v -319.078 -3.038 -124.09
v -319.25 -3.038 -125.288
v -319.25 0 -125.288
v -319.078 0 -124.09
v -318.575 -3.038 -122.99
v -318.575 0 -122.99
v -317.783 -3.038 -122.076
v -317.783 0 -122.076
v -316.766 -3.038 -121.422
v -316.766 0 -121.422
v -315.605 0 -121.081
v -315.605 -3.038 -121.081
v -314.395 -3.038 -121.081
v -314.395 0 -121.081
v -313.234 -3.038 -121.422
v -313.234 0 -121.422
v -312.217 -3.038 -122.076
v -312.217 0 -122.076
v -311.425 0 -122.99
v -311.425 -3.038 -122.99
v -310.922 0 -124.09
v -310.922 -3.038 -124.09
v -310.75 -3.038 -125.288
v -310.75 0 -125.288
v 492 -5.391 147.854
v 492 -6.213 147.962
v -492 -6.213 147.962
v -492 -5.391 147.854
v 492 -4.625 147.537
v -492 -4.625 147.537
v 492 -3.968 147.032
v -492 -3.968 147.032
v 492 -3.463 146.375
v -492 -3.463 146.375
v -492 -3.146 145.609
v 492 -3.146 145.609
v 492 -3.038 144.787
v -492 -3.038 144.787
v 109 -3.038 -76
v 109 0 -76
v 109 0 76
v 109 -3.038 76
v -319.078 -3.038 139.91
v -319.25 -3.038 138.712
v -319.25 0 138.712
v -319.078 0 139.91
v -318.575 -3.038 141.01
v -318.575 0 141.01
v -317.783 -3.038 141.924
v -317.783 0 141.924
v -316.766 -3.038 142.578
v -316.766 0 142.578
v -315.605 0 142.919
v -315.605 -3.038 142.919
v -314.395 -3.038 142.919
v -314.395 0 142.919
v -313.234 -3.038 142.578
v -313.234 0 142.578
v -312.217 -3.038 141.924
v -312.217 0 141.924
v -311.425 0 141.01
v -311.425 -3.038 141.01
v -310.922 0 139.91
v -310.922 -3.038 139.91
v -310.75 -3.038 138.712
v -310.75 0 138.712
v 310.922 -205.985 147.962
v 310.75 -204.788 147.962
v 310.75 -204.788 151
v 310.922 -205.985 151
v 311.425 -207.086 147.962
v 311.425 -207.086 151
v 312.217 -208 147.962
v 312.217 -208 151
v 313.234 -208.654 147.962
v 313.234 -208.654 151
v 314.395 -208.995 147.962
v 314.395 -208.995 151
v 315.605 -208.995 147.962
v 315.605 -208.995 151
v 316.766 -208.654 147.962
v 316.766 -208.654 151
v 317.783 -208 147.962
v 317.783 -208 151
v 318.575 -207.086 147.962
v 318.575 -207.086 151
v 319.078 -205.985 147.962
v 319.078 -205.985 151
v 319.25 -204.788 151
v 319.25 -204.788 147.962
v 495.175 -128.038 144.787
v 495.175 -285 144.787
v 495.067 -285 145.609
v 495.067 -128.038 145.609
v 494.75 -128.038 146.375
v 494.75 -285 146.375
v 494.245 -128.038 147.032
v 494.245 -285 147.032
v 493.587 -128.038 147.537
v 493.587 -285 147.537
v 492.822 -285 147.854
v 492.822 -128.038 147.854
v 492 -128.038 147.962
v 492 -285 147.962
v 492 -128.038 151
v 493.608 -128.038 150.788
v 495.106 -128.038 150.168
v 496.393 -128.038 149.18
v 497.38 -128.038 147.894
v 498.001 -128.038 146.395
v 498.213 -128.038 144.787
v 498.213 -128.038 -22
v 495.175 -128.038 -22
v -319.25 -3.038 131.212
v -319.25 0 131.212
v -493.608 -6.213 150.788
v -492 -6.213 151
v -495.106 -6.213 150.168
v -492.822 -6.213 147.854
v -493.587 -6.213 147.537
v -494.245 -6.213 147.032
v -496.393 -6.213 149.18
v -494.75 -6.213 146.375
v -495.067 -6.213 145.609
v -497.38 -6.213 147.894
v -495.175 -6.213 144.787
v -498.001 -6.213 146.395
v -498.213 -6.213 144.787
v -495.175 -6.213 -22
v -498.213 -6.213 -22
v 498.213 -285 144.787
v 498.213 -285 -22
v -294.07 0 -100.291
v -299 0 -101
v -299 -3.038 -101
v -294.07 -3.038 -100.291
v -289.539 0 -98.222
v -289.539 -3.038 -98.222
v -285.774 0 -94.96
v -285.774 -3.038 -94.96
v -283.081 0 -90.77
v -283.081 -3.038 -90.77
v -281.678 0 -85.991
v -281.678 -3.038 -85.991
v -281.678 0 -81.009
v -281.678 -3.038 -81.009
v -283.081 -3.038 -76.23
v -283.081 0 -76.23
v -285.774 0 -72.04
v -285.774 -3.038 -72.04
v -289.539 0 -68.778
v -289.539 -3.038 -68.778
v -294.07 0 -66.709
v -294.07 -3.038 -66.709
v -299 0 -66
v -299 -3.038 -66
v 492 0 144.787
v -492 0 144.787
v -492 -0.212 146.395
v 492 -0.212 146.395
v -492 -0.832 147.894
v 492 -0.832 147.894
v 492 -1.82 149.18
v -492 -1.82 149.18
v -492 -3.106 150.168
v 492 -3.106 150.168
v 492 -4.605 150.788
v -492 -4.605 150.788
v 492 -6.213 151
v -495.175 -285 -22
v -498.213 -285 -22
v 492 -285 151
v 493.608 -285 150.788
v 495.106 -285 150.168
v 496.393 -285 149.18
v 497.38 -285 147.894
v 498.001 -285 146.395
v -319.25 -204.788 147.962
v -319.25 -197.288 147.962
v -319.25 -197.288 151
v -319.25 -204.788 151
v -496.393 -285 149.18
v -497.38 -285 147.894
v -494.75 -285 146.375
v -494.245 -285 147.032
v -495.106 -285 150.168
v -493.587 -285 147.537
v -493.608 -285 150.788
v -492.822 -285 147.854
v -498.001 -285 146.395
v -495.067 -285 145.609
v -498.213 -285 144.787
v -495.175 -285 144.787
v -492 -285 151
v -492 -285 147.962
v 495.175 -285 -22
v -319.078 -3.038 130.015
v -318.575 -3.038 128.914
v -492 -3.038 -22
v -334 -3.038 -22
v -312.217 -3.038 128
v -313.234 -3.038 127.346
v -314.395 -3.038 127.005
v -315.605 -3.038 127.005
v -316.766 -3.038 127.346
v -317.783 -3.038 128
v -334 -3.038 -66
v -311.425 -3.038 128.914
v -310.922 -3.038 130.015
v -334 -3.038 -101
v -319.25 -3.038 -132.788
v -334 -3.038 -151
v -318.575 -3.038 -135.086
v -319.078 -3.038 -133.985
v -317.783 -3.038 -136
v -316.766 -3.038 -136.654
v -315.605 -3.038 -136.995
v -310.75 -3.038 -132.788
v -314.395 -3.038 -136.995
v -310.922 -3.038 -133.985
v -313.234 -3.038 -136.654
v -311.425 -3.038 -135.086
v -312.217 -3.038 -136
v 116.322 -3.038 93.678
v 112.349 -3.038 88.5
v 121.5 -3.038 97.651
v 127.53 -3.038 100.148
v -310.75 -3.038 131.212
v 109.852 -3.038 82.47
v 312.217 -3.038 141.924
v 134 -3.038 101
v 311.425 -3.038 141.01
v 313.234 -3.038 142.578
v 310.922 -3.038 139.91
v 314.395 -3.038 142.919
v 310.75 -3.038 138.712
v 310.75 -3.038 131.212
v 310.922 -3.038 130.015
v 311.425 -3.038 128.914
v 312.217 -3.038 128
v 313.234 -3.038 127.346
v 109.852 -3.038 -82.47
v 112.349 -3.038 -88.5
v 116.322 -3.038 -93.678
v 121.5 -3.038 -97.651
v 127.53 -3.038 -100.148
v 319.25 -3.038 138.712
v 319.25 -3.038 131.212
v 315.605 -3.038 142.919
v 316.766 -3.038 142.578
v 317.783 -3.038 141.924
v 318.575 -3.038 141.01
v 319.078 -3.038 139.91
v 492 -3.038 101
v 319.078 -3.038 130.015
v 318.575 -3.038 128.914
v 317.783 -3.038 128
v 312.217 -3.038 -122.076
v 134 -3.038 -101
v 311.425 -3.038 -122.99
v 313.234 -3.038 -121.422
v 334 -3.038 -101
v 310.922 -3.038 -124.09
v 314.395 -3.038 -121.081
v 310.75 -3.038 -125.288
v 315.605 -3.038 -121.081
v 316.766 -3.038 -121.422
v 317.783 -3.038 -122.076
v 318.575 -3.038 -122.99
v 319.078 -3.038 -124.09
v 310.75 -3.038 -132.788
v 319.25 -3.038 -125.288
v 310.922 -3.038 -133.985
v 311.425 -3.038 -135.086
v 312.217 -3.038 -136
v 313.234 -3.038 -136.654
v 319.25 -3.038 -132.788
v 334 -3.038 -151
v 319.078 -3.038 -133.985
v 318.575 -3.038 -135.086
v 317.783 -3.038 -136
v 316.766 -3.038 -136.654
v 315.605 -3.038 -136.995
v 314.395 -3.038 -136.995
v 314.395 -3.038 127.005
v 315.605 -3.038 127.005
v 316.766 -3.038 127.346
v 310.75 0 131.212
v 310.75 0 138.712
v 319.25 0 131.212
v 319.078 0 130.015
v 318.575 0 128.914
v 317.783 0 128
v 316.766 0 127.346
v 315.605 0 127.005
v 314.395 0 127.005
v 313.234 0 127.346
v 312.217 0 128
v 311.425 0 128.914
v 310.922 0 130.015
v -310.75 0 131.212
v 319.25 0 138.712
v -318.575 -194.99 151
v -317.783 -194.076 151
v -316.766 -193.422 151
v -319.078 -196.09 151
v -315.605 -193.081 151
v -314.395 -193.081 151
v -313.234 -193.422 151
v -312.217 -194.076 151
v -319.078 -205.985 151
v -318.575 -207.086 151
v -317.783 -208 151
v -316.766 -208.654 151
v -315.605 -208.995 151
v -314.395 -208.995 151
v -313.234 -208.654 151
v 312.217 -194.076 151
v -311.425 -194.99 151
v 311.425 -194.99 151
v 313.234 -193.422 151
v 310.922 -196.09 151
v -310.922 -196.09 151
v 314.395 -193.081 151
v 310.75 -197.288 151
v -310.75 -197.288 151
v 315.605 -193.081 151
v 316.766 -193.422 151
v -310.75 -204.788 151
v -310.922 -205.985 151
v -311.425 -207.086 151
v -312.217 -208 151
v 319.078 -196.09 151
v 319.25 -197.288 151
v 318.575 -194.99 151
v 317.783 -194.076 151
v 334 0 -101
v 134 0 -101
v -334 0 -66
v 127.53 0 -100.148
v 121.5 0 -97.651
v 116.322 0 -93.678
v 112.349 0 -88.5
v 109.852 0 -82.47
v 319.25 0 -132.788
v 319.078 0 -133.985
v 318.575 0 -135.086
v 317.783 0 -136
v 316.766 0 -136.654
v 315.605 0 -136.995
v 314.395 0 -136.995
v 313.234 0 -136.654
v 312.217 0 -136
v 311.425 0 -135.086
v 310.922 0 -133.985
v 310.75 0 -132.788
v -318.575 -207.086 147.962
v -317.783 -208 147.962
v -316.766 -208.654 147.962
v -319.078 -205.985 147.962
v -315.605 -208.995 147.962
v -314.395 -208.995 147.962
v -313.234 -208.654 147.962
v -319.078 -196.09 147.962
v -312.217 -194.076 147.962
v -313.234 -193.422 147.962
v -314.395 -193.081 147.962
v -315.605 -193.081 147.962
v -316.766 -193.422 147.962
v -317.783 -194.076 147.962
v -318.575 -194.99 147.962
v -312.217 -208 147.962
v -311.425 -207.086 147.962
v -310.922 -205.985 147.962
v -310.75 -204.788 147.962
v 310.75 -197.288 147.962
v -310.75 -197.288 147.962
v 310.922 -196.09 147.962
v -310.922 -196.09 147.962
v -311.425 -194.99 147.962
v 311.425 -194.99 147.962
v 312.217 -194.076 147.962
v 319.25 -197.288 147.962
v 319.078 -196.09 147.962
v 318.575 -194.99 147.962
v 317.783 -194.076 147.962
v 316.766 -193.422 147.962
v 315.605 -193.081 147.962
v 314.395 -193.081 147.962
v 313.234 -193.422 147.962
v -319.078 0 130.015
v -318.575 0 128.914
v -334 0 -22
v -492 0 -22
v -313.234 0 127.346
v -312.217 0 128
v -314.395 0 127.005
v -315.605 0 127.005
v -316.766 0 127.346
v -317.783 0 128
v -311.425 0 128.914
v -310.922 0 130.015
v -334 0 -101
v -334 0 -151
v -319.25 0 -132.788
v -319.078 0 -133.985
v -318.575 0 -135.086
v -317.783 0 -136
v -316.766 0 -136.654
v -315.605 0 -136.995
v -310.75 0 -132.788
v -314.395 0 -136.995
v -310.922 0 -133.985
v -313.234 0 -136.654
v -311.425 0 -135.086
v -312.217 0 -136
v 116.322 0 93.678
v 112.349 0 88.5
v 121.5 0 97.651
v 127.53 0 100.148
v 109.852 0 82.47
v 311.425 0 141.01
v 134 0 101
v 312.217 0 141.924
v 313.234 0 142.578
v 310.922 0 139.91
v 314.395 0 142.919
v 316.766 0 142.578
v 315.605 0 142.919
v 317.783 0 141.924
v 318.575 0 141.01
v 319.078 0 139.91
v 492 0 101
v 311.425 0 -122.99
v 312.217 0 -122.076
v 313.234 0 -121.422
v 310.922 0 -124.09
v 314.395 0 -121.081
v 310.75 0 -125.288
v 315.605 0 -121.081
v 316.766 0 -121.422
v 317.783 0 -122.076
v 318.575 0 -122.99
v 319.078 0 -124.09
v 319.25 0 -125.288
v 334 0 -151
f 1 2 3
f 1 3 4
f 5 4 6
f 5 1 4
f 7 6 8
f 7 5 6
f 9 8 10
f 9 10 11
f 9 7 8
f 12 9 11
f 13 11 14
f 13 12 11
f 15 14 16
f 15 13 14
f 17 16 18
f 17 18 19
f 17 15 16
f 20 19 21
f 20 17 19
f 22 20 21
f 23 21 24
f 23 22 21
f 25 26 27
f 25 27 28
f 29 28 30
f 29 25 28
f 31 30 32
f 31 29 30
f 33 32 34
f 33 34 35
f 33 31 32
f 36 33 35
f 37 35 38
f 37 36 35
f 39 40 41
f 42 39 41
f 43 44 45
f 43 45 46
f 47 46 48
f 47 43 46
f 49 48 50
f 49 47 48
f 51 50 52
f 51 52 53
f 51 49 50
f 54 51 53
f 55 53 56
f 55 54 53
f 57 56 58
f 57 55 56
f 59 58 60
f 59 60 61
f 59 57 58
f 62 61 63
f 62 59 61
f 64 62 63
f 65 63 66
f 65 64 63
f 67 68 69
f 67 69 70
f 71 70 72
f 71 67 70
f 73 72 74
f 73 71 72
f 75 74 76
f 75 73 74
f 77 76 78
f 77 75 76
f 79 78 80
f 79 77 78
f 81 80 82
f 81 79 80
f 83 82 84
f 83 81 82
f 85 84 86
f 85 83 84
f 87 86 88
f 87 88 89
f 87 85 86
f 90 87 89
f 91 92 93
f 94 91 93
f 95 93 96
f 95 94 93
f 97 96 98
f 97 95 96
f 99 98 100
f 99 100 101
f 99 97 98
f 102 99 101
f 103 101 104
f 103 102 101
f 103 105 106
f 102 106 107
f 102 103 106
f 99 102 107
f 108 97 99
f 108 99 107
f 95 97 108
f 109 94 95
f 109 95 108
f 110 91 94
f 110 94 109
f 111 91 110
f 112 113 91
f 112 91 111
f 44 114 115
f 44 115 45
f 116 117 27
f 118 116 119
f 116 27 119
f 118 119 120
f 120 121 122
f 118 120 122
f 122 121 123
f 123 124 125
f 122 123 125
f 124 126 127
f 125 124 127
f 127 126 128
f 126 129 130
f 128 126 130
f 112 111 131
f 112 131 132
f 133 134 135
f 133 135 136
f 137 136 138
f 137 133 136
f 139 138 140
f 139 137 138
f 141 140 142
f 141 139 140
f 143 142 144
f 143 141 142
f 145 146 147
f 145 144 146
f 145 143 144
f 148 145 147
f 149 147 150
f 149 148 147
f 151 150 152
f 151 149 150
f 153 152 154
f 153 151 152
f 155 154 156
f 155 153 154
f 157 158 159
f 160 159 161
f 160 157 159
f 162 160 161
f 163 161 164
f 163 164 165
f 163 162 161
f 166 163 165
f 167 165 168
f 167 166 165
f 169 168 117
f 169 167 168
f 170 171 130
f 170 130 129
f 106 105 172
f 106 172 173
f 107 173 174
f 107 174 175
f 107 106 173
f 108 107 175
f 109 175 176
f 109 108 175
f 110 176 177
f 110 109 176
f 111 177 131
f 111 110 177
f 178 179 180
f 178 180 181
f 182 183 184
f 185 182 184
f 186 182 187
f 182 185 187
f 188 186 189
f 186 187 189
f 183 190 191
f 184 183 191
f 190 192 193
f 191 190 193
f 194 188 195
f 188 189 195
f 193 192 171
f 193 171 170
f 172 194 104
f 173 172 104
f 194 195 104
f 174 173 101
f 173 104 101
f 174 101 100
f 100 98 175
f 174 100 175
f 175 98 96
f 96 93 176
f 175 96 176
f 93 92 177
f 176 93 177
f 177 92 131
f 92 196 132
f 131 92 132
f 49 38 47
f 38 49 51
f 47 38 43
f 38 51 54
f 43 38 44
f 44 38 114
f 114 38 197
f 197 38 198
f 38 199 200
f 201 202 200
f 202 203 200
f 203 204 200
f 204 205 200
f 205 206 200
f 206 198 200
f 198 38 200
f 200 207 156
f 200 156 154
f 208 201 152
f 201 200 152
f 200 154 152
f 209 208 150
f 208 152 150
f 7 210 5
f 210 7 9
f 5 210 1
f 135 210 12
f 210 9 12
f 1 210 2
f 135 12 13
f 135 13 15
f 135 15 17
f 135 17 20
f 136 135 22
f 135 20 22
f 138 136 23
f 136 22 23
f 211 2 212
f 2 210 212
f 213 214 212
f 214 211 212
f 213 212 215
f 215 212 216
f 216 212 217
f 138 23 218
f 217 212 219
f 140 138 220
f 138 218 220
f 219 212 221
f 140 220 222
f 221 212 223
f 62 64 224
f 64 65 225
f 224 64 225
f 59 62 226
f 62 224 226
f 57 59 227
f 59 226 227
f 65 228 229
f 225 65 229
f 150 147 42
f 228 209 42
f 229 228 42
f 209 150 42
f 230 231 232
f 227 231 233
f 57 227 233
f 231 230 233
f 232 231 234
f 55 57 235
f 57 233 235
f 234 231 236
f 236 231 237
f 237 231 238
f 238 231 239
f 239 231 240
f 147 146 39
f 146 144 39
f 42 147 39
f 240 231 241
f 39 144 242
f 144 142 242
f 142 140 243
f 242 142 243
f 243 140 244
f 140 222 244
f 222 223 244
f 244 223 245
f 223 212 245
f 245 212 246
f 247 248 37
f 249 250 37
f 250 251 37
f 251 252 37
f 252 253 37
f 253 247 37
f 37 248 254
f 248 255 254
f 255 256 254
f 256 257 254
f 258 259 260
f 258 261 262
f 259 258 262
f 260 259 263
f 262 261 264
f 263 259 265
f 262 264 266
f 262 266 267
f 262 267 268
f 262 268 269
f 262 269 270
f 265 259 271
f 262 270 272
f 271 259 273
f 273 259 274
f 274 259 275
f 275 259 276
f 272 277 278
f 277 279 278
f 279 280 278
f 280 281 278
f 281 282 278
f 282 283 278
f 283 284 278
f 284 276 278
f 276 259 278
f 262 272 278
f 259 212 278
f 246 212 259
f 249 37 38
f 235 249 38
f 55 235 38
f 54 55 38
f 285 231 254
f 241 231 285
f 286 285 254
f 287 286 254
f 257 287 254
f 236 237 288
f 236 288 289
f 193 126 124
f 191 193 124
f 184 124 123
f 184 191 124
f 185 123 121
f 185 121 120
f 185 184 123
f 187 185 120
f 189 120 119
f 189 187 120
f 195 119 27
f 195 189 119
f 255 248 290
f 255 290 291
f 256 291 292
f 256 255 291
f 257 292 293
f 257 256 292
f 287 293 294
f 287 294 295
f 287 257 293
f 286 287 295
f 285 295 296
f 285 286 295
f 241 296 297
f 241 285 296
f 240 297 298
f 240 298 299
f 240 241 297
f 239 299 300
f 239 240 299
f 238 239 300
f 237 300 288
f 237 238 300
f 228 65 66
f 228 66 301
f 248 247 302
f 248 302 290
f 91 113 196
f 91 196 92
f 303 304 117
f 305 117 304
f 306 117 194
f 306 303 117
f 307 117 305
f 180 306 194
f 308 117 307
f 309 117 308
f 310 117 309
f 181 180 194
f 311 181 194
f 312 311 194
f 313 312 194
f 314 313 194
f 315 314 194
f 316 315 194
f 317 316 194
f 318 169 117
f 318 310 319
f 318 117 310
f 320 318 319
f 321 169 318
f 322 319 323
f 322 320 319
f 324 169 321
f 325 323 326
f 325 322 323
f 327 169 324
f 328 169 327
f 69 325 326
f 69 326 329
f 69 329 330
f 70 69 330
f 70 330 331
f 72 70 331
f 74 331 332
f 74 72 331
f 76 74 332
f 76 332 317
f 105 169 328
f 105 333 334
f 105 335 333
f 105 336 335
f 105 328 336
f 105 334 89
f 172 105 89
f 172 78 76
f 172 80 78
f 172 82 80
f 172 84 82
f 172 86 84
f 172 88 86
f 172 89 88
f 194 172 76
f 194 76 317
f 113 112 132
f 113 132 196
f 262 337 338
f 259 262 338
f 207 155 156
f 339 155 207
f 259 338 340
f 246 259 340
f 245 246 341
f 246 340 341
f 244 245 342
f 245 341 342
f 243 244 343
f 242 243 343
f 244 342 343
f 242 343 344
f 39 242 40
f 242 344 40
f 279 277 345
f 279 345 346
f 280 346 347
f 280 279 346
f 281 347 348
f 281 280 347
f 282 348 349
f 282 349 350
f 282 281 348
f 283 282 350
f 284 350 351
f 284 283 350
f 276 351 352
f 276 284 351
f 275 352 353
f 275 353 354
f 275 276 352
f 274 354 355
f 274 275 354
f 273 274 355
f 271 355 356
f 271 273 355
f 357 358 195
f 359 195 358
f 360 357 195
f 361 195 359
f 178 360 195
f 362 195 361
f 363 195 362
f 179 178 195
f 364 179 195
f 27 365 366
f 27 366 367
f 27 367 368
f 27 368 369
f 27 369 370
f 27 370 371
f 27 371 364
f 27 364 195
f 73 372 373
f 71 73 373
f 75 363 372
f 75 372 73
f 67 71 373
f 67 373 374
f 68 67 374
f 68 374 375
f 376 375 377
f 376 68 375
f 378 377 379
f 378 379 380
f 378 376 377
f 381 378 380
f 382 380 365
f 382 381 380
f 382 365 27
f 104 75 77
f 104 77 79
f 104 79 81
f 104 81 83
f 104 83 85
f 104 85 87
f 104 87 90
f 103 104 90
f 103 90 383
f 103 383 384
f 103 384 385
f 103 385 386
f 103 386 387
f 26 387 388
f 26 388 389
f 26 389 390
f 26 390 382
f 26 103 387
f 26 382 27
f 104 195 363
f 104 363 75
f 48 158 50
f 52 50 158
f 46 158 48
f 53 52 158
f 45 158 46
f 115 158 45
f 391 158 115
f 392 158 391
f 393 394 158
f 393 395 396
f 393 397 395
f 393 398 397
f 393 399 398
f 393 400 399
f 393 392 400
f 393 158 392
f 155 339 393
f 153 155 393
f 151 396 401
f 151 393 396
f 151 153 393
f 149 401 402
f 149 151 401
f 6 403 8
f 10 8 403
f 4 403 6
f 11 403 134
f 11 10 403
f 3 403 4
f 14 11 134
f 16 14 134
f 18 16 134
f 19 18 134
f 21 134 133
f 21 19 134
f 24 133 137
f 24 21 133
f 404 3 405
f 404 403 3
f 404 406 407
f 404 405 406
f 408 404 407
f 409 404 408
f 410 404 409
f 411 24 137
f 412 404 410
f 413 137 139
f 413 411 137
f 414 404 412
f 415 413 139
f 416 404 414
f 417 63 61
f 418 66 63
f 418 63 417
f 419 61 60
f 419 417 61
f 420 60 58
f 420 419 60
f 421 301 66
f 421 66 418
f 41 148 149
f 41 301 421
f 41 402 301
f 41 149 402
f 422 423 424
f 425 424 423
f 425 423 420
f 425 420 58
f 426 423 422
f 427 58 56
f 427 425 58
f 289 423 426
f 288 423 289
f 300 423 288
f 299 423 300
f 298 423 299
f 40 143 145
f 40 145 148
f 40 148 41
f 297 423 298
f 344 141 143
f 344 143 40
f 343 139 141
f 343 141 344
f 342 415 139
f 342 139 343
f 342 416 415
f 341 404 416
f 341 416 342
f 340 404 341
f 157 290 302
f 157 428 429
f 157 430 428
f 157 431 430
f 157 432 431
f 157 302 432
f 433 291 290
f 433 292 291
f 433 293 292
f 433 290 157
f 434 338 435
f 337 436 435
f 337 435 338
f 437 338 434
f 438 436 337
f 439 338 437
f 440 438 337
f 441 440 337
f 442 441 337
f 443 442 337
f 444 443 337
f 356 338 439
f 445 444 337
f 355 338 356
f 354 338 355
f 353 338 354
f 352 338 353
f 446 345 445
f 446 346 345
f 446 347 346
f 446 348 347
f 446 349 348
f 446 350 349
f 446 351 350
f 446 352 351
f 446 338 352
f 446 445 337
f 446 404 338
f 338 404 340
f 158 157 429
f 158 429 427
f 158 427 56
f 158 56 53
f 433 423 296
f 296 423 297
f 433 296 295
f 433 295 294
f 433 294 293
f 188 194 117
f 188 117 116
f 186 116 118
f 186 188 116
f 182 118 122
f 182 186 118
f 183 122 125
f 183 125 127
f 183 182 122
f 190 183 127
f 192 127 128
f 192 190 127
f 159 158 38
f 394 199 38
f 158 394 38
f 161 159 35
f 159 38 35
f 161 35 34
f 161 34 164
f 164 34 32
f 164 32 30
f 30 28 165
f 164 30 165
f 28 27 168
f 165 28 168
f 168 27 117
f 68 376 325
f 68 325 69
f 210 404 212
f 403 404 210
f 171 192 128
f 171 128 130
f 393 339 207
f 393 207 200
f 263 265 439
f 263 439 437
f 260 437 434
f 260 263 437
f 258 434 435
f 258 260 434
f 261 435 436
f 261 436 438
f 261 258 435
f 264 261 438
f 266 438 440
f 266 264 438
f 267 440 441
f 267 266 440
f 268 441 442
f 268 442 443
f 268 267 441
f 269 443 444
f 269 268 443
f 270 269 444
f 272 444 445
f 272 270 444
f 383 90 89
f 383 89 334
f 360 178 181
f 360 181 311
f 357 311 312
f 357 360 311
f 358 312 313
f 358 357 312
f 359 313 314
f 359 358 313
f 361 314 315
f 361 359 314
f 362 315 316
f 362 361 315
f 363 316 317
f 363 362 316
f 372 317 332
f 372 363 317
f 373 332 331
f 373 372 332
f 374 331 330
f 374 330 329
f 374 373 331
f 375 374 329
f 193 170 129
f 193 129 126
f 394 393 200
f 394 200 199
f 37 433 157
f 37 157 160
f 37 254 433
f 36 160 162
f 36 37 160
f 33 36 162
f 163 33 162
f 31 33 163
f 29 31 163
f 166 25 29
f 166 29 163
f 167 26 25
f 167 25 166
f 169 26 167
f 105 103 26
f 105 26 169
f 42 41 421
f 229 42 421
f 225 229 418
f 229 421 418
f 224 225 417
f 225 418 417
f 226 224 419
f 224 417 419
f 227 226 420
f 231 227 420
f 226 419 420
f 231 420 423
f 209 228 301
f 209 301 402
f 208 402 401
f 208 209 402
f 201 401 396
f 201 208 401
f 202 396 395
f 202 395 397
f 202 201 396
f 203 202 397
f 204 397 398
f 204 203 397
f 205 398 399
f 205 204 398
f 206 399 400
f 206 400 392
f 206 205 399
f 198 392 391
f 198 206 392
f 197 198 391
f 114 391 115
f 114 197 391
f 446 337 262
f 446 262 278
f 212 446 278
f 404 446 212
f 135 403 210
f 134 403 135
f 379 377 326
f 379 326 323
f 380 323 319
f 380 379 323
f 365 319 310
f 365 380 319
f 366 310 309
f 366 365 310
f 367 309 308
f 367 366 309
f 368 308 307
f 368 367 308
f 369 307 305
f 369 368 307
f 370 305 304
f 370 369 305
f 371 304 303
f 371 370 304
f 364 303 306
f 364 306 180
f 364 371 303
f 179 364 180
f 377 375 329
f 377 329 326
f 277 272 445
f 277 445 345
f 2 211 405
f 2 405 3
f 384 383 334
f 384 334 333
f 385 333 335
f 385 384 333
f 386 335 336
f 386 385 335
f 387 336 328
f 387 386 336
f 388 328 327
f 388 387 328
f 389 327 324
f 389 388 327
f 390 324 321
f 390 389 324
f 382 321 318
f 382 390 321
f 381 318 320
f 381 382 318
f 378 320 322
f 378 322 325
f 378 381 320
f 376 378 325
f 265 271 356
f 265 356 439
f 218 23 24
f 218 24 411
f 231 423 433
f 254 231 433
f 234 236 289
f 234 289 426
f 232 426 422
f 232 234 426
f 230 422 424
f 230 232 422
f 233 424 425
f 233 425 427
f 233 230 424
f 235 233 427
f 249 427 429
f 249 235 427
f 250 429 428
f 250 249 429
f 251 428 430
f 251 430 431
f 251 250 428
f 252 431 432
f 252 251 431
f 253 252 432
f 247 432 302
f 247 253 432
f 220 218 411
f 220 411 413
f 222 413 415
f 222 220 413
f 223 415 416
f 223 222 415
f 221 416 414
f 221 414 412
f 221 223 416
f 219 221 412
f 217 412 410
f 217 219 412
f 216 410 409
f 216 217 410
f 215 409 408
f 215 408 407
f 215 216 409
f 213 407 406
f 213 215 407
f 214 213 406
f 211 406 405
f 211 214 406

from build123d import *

# Parameters (mm, degrees)
BASE_FLANGE1_DEPTH           = 3.03784
EDGE_FLANGE1_STRIP_W         = 18.50136
EDGE_FLANGE1_STRIP_H         = 3.03784
EDGE_FLANGE1_STRIP_CUT_DEPTH = 984
EDGE_FLANGE1_DEPTH           = 984
EDGE_FLANGE2_DEPTH           = 278.78716
EDGE_FLANGE2_BEND_DEPTH      = 156.962160064
CUT_EXTRUDE1_DEPTH           = 594.499817979
CUT_EXTRUDE2_DEPTH           = 594.499817979
M6_START                     = -3.03784
M6_CLEARANCE_SLOT1_DEPTH     = 3.03784
M6_START_2                   = 147.96216
M6_CLEARANCE_SLOT2_DEPTH     = 3.03784


# Read off the part's stored shape, not the designer's step: M6 Clearance Slot1, M6 Clearance Slot2
# Sheet-metal steps are written as plain solids
with BuildPart() as part:
    # Sketch1 → Base-Flange1 (new body)
    with BuildSketch(Plane(origin=(0, 0, 0), x_dir=(1, 0, 0), z_dir=(0, 1, 0))):
        Polygon((334, 151), (-334, 151), (-334, 22), (-492, 22), (-492, -151), (334, -151), (492, -151), (492, 22), (334, 22), align=None)
    extrude(amount=-BASE_FLANGE1_DEPTH)

    # Edge-Flange1 strip (across the edge) → Edge-Flange1 strip cut (cut)
    with BuildSketch(Plane(origin=(492, -3.03784, 151), x_dir=(0, 0, -1), z_dir=(-1, 0, 0))):
        with Locations((-3.03784, -1.51892)):
            Rectangle(EDGE_FLANGE1_STRIP_W, EDGE_FLANGE1_STRIP_H)
    extrude(amount=EDGE_FLANGE1_STRIP_CUT_DEPTH, mode=Mode.SUBTRACT)

    # Edge-Flange1 section (across the edge) → Edge-Flange1 (add)
    with BuildSketch(Plane(origin=(492, -3.03784, 151), x_dir=(0, 0, -1), z_dir=(-1, 0, 0))):
        with BuildLine():
            Line((0, 3.175), (0, 281.96216))
            Line((0, 281.96216), (3.03784, 281.96216))
            Line((3.03784, 281.96216), (3.03784, 3.175))
            ThreePointArc((3.03784, 3.175), (3.96777597, 0.92993597), (6.21284, 0))
            Line((6.21284, 0), (6.21284, -3.03784))
            ThreePointArc((6.21284, -3.03784), (1.819698706, -1.218141294), (0, 3.175))
        make_face()
    extrude(amount=EDGE_FLANGE1_DEPTH)

    # Edge-Flange2 section (across the edge) → Edge-Flange2 (add)
    with BuildSketch(Plane(origin=(-495.175, -285, 147.96216), x_dir=(1, 0, 0), z_dir=(0, 1, 0))):
        with BuildLine():
            Line((-3.03784, 3.175), (-3.03784, 169.96216))
            Line((-3.03784, 169.96216), (0, 169.96216))
            Line((0, 169.96216), (0, 3.175))
            ThreePointArc((0, 3.175), (0.92993597, 0.92993597), (3.175, 0))
            Line((3.175, 0), (3.175, -3.03784))
            ThreePointArc((3.175, -3.03784), (-1.218141294, -1.218141294), (-3.03784, 3.175))
        make_face()
    extrude(amount=EDGE_FLANGE2_DEPTH)

    # Edge-Flange2 section 2 (across the edge) → Edge-Flange2 bend (add)
    with BuildSketch(Plane(origin=(495.175, -128.037839936, 147.96216), x_dir=(-1, 0, 0), z_dir=(0, -1, 0))):
        with BuildLine():
            Line((-3.03784, 3.175), (-3.03784, 169.96216))
            Line((-3.03784, 169.96216), (0, 169.96216))
            Line((0, 169.96216), (0, 3.175))
            ThreePointArc((0, 3.175), (0.92993597, 0.92993597), (3.175, 0))
            Line((3.175, 0), (3.175, -3.03784))
            ThreePointArc((3.175, -3.03784), (-1.218141294, -1.218141294), (-3.03784, 3.175))
        make_face()
    extrude(amount=EDGE_FLANGE2_BEND_DEPTH)

    # Sketch15 → Cut-Extrude1 (cut, through all)
    with BuildSketch(Plane(origin=(0, 0, 0), x_dir=(1, 0, 0), z_dir=(0, 1, 0))):
        with BuildLine():
            Line((492, 100.999999924), (134, 100.999999924))
            ThreePointArc((134, 100.999999924), (116.32233047, 93.677669454), (109, 75.999999924))
            Line((109, 75.999999924), (109, -76))
            ThreePointArc((109, -76), (116.32233047, -93.67766953), (134, -101))
            Line((134, -101), (492, -101))
            Line((492, -101), (492, 100.999999924))
        make_face()
    extrude(amount=-CUT_EXTRUDE1_DEPTH, mode=Mode.SUBTRACT)

    # Sketch16 → Cut-Extrude2 (cut, through all)
    with BuildSketch(Plane(origin=(0, 0, 0), x_dir=(1, 0, 0), z_dir=(0, 1, 0))):
        with BuildLine():
            Line((-334, 101), (-299, 101))
            ThreePointArc((-299, 101), (-281.5, 83.5), (-299, 66))
            Line((-299, 66), (-334, 66))
            Line((-334, 66), (-334, 101))
        make_face()
    extrude(amount=-CUT_EXTRUDE2_DEPTH, mode=Mode.SUBTRACT)

    # M6 Clearance Slot1 outline → M6 Clearance Slot1 (cut)
    with BuildSketch(Plane(origin=(0, 0, 0), x_dir=(1, 0, 0), z_dir=(0, 1, 0)).offset(M6_START)):
        with BuildLine():
            Line((319.25, 125.287839814), (319.25, 132.787839814))
            ThreePointArc((319.25, 132.787839814), (315, 137.037839814), (310.75, 132.787839814))
            Line((310.75, 132.787839814), (310.75, 125.287839814))
            ThreePointArc((310.75, 125.287839814), (315, 121.037839814), (319.25, 125.287839814))
        make_face()
        with BuildLine():
            ThreePointArc((319.25, -131.212160186), (315, -126.962160186), (310.75, -131.212160186))
            Line((310.75, -131.212160186), (310.75, -138.712160186))
            ThreePointArc((310.75, -138.712160186), (315, -142.962160186), (319.25, -138.712160186))
            Line((319.25, -138.712160186), (319.25, -131.212160186))
        make_face()
        with BuildLine():
            ThreePointArc((-310.75, -131.212160186), (-315, -126.962160186), (-319.25, -131.212160186))
            Line((-319.25, -131.212160186), (-319.25, -138.712160186))
            ThreePointArc((-319.25, -138.712160186), (-315, -142.962160186), (-310.75, -138.712160186))
            Line((-310.75, -138.712160186), (-310.75, -131.212160186))
        make_face()
        with BuildLine():
            ThreePointArc((-310.75, 132.787839814), (-315, 137.037839814), (-319.25, 132.787839814))
            Line((-319.25, 132.787839814), (-319.25, 125.287839814))
            ThreePointArc((-319.25, 125.287839814), (-315, 121.037839814), (-310.75, 125.287839814))
            Line((-310.75, 125.287839814), (-310.75, 132.787839814))
        make_face()
    extrude(amount=M6_CLEARANCE_SLOT1_DEPTH, mode=Mode.SUBTRACT)

    # M6 Clearance Slot2 outline → M6 Clearance Slot2 (cut)
    with BuildSketch(Plane.XY.offset(M6_START_2)):
        with BuildLine():
            ThreePointArc((319.250000047, -197.28784), (315.000000047, -193.03784), (310.750000047, -197.28784))
            Line((310.750000047, -197.28784), (310.750000047, -204.78784))
            ThreePointArc((310.750000047, -204.78784), (315.000000047, -209.03784), (319.250000047, -204.78784))
            Line((319.250000047, -204.78784), (319.250000047, -197.28784))
        make_face()
        with BuildLine():
            ThreePointArc((-310.750000047, -197.28784), (-315.000000047, -193.03784), (-319.250000047, -197.28784))
            Line((-319.250000047, -197.28784), (-319.250000047, -204.78784))
            ThreePointArc((-319.250000047, -204.78784), (-315.000000047, -209.03784), (-310.750000047, -204.78784))
            Line((-310.750000047, -204.78784), (-310.750000047, -197.28784))
        make_face()
    extrude(amount=M6_CLEARANCE_SLOT2_DEPTH, mode=Mode.SUBTRACT)


solid = part.part
